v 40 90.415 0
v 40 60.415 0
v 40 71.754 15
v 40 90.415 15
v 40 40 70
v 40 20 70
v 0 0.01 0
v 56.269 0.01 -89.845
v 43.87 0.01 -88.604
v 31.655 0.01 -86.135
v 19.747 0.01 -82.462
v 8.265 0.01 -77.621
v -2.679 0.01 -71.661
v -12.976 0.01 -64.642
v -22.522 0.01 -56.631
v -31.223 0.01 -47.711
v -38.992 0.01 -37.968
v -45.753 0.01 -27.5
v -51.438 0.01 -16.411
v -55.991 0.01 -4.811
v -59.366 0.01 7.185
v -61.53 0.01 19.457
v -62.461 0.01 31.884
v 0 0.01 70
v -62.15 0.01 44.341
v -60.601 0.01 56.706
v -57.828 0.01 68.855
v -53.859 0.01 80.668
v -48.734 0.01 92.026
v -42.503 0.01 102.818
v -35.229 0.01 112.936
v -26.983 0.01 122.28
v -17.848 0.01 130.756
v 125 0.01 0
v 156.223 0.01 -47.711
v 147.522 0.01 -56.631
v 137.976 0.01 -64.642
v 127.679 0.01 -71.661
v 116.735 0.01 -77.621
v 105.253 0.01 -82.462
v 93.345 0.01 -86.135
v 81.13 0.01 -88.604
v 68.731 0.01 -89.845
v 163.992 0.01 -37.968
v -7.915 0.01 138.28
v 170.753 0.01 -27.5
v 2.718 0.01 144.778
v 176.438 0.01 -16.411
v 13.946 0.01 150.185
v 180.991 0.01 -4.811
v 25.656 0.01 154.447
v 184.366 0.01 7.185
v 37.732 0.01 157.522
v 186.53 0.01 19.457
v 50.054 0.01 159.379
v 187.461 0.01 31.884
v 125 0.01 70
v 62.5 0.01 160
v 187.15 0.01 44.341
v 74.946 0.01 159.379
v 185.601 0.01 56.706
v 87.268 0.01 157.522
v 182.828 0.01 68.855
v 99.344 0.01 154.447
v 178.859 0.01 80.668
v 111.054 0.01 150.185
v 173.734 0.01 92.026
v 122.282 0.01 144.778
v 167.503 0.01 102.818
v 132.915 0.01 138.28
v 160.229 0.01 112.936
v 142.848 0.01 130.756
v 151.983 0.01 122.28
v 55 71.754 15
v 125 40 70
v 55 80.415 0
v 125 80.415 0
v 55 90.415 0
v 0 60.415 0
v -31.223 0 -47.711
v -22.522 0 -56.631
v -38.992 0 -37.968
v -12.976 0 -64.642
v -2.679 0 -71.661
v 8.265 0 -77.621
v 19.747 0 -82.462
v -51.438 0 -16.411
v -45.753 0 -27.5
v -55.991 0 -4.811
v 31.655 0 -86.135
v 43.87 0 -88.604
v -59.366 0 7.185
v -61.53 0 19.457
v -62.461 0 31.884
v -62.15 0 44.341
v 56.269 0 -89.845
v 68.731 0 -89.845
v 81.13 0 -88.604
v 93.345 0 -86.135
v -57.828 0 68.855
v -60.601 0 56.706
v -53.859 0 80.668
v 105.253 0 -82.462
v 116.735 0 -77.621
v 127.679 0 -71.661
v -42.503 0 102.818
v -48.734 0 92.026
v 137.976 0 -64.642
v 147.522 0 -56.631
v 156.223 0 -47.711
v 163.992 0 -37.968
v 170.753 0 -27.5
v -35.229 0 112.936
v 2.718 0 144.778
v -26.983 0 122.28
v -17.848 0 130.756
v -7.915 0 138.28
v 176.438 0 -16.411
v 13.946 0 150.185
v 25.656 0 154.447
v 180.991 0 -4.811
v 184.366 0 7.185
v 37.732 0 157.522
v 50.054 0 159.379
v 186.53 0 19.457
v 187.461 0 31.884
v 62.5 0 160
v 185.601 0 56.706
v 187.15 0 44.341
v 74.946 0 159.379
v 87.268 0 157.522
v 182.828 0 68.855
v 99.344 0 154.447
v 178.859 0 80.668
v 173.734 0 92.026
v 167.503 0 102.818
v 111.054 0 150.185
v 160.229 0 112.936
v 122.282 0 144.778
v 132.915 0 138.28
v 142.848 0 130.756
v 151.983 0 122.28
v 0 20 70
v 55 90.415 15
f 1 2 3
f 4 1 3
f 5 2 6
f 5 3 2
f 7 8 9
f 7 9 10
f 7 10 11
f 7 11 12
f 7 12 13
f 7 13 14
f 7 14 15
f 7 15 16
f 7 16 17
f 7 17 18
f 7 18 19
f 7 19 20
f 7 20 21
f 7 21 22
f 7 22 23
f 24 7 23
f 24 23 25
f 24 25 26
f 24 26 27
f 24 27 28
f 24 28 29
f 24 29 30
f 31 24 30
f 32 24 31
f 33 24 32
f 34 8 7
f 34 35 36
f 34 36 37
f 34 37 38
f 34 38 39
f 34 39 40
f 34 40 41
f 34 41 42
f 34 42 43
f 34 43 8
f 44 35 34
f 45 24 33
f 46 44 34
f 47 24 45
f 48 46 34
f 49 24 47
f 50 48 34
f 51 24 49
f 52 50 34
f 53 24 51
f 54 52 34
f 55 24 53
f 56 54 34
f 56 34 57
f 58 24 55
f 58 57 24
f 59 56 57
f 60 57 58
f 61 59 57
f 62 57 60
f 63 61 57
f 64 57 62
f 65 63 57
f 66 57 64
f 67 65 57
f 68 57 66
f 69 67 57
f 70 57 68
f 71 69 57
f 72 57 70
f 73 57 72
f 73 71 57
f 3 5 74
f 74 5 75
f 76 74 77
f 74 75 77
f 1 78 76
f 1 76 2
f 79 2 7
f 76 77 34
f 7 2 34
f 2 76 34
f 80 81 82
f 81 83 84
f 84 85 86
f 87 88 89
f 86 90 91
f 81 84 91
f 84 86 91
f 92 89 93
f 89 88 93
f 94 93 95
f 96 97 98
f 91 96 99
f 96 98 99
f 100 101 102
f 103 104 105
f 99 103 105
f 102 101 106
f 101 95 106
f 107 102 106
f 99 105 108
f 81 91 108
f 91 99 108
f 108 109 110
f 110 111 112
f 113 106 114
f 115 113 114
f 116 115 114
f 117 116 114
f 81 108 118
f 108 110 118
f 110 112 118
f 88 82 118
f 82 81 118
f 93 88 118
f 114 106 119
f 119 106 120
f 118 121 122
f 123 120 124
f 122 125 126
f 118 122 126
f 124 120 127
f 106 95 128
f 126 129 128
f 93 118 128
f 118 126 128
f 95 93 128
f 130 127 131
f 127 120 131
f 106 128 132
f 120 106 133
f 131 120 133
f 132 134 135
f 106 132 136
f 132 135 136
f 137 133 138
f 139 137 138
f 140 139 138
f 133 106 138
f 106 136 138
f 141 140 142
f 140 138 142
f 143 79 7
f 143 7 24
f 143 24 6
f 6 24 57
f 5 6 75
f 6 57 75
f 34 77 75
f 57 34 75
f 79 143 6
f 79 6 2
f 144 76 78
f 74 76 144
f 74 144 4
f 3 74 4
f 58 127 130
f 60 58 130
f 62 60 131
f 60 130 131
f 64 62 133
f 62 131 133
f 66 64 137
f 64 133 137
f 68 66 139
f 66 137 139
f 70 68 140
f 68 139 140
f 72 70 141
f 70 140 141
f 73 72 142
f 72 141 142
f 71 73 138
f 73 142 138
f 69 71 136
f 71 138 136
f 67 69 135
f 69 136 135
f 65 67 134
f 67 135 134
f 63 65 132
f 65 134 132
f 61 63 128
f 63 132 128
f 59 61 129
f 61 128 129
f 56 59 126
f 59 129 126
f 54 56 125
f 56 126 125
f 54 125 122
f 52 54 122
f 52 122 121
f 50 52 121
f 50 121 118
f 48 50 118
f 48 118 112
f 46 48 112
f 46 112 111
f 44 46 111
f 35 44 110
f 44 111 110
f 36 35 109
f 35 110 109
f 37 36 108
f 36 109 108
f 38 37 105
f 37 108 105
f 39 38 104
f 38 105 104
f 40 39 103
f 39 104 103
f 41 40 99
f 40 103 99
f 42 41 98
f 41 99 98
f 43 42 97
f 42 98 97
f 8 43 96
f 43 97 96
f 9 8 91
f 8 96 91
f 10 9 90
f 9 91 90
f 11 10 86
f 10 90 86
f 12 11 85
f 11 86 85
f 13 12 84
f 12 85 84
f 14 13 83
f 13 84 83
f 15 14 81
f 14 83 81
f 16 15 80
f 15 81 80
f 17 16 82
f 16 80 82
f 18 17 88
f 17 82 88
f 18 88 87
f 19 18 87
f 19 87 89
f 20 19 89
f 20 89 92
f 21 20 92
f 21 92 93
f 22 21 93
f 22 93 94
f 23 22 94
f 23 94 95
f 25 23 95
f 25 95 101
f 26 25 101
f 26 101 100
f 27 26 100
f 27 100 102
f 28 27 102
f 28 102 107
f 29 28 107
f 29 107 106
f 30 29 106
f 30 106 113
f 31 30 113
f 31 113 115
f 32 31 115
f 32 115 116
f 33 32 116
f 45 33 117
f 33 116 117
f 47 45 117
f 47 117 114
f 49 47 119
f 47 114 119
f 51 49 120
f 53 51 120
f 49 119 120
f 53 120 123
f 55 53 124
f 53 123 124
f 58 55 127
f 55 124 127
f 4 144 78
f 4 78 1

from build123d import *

# Parameters (mm, degrees)
SKETCH1_W           = 125
SKETCH1_H           = 70
EXTRUDE1_DEPTH      = 20
EXTRUDE2_DEPTH      = 40
EXTRUDE3_DEPTH      = 85
SKETCH5_W           = 15
SKETCH5_H           = 15
EXTRUDE5_DEPTH      = 10
EXTRUDE5_DEPTH_BACK = 20
SKETCH6_R           = 125
EXTRUDE6_DEPTH      = 0.01


with BuildPart() as part:
    # Sketch1 → Extrude1 (new body)
    with BuildSketch(Plane(origin=(0, 0, 0), x_dir=(1, 0, 0), z_dir=(0, 1, 0))):
        with Locations((62.5, -35)):
            Rectangle(SKETCH1_W, SKETCH1_H)
    extrude(amount=EXTRUDE1_DEPTH)

    # Sketch2 → Extrude2 (add)
    with BuildSketch(Plane.ZY):
        Polygon((0, 20), (70, 20), (0, 60.414518843), align=None)
    extrude(amount=-EXTRUDE2_DEPTH)

    # Sketch3 → Extrude3 (add)
    with BuildSketch(Plane(origin=(125, 0, 0), x_dir=(0, 0, -1), z_dir=(1, 0, 0))):
        Polygon((-70, 20), (-70, 40), (0, 80.414518843), (0, 20), align=None)
    extrude(amount=-EXTRUDE3_DEPTH)

    # Sketch5 → Extrude5 (add, two sides)
    with BuildSketch(Plane(origin=(0, 80.414518843, 0), x_dir=(-1, 0, 0), z_dir=(0, 1, 0))) as extrude5_sk:
        with Locations((-47.5, 7.5)):
            Rectangle(SKETCH5_W, SKETCH5_H)
    extrude(amount=EXTRUDE5_DEPTH)
    extrude(extrude5_sk.sketch, amount=-EXTRUDE5_DEPTH_BACK)

    # Sketch6 → Extrude6 (add)
    with BuildSketch(Plane(origin=(0, 0, 0), x_dir=(1, 0, 0), z_dir=(0, 1, 0))):
        with Locations(Location((62.5, -35, 0), (0, 0, 270))):  # turned: the seam where the file's is
            Circle(SKETCH6_R)
    extrude(amount=EXTRUDE6_DEPTH)


solid = part.part
